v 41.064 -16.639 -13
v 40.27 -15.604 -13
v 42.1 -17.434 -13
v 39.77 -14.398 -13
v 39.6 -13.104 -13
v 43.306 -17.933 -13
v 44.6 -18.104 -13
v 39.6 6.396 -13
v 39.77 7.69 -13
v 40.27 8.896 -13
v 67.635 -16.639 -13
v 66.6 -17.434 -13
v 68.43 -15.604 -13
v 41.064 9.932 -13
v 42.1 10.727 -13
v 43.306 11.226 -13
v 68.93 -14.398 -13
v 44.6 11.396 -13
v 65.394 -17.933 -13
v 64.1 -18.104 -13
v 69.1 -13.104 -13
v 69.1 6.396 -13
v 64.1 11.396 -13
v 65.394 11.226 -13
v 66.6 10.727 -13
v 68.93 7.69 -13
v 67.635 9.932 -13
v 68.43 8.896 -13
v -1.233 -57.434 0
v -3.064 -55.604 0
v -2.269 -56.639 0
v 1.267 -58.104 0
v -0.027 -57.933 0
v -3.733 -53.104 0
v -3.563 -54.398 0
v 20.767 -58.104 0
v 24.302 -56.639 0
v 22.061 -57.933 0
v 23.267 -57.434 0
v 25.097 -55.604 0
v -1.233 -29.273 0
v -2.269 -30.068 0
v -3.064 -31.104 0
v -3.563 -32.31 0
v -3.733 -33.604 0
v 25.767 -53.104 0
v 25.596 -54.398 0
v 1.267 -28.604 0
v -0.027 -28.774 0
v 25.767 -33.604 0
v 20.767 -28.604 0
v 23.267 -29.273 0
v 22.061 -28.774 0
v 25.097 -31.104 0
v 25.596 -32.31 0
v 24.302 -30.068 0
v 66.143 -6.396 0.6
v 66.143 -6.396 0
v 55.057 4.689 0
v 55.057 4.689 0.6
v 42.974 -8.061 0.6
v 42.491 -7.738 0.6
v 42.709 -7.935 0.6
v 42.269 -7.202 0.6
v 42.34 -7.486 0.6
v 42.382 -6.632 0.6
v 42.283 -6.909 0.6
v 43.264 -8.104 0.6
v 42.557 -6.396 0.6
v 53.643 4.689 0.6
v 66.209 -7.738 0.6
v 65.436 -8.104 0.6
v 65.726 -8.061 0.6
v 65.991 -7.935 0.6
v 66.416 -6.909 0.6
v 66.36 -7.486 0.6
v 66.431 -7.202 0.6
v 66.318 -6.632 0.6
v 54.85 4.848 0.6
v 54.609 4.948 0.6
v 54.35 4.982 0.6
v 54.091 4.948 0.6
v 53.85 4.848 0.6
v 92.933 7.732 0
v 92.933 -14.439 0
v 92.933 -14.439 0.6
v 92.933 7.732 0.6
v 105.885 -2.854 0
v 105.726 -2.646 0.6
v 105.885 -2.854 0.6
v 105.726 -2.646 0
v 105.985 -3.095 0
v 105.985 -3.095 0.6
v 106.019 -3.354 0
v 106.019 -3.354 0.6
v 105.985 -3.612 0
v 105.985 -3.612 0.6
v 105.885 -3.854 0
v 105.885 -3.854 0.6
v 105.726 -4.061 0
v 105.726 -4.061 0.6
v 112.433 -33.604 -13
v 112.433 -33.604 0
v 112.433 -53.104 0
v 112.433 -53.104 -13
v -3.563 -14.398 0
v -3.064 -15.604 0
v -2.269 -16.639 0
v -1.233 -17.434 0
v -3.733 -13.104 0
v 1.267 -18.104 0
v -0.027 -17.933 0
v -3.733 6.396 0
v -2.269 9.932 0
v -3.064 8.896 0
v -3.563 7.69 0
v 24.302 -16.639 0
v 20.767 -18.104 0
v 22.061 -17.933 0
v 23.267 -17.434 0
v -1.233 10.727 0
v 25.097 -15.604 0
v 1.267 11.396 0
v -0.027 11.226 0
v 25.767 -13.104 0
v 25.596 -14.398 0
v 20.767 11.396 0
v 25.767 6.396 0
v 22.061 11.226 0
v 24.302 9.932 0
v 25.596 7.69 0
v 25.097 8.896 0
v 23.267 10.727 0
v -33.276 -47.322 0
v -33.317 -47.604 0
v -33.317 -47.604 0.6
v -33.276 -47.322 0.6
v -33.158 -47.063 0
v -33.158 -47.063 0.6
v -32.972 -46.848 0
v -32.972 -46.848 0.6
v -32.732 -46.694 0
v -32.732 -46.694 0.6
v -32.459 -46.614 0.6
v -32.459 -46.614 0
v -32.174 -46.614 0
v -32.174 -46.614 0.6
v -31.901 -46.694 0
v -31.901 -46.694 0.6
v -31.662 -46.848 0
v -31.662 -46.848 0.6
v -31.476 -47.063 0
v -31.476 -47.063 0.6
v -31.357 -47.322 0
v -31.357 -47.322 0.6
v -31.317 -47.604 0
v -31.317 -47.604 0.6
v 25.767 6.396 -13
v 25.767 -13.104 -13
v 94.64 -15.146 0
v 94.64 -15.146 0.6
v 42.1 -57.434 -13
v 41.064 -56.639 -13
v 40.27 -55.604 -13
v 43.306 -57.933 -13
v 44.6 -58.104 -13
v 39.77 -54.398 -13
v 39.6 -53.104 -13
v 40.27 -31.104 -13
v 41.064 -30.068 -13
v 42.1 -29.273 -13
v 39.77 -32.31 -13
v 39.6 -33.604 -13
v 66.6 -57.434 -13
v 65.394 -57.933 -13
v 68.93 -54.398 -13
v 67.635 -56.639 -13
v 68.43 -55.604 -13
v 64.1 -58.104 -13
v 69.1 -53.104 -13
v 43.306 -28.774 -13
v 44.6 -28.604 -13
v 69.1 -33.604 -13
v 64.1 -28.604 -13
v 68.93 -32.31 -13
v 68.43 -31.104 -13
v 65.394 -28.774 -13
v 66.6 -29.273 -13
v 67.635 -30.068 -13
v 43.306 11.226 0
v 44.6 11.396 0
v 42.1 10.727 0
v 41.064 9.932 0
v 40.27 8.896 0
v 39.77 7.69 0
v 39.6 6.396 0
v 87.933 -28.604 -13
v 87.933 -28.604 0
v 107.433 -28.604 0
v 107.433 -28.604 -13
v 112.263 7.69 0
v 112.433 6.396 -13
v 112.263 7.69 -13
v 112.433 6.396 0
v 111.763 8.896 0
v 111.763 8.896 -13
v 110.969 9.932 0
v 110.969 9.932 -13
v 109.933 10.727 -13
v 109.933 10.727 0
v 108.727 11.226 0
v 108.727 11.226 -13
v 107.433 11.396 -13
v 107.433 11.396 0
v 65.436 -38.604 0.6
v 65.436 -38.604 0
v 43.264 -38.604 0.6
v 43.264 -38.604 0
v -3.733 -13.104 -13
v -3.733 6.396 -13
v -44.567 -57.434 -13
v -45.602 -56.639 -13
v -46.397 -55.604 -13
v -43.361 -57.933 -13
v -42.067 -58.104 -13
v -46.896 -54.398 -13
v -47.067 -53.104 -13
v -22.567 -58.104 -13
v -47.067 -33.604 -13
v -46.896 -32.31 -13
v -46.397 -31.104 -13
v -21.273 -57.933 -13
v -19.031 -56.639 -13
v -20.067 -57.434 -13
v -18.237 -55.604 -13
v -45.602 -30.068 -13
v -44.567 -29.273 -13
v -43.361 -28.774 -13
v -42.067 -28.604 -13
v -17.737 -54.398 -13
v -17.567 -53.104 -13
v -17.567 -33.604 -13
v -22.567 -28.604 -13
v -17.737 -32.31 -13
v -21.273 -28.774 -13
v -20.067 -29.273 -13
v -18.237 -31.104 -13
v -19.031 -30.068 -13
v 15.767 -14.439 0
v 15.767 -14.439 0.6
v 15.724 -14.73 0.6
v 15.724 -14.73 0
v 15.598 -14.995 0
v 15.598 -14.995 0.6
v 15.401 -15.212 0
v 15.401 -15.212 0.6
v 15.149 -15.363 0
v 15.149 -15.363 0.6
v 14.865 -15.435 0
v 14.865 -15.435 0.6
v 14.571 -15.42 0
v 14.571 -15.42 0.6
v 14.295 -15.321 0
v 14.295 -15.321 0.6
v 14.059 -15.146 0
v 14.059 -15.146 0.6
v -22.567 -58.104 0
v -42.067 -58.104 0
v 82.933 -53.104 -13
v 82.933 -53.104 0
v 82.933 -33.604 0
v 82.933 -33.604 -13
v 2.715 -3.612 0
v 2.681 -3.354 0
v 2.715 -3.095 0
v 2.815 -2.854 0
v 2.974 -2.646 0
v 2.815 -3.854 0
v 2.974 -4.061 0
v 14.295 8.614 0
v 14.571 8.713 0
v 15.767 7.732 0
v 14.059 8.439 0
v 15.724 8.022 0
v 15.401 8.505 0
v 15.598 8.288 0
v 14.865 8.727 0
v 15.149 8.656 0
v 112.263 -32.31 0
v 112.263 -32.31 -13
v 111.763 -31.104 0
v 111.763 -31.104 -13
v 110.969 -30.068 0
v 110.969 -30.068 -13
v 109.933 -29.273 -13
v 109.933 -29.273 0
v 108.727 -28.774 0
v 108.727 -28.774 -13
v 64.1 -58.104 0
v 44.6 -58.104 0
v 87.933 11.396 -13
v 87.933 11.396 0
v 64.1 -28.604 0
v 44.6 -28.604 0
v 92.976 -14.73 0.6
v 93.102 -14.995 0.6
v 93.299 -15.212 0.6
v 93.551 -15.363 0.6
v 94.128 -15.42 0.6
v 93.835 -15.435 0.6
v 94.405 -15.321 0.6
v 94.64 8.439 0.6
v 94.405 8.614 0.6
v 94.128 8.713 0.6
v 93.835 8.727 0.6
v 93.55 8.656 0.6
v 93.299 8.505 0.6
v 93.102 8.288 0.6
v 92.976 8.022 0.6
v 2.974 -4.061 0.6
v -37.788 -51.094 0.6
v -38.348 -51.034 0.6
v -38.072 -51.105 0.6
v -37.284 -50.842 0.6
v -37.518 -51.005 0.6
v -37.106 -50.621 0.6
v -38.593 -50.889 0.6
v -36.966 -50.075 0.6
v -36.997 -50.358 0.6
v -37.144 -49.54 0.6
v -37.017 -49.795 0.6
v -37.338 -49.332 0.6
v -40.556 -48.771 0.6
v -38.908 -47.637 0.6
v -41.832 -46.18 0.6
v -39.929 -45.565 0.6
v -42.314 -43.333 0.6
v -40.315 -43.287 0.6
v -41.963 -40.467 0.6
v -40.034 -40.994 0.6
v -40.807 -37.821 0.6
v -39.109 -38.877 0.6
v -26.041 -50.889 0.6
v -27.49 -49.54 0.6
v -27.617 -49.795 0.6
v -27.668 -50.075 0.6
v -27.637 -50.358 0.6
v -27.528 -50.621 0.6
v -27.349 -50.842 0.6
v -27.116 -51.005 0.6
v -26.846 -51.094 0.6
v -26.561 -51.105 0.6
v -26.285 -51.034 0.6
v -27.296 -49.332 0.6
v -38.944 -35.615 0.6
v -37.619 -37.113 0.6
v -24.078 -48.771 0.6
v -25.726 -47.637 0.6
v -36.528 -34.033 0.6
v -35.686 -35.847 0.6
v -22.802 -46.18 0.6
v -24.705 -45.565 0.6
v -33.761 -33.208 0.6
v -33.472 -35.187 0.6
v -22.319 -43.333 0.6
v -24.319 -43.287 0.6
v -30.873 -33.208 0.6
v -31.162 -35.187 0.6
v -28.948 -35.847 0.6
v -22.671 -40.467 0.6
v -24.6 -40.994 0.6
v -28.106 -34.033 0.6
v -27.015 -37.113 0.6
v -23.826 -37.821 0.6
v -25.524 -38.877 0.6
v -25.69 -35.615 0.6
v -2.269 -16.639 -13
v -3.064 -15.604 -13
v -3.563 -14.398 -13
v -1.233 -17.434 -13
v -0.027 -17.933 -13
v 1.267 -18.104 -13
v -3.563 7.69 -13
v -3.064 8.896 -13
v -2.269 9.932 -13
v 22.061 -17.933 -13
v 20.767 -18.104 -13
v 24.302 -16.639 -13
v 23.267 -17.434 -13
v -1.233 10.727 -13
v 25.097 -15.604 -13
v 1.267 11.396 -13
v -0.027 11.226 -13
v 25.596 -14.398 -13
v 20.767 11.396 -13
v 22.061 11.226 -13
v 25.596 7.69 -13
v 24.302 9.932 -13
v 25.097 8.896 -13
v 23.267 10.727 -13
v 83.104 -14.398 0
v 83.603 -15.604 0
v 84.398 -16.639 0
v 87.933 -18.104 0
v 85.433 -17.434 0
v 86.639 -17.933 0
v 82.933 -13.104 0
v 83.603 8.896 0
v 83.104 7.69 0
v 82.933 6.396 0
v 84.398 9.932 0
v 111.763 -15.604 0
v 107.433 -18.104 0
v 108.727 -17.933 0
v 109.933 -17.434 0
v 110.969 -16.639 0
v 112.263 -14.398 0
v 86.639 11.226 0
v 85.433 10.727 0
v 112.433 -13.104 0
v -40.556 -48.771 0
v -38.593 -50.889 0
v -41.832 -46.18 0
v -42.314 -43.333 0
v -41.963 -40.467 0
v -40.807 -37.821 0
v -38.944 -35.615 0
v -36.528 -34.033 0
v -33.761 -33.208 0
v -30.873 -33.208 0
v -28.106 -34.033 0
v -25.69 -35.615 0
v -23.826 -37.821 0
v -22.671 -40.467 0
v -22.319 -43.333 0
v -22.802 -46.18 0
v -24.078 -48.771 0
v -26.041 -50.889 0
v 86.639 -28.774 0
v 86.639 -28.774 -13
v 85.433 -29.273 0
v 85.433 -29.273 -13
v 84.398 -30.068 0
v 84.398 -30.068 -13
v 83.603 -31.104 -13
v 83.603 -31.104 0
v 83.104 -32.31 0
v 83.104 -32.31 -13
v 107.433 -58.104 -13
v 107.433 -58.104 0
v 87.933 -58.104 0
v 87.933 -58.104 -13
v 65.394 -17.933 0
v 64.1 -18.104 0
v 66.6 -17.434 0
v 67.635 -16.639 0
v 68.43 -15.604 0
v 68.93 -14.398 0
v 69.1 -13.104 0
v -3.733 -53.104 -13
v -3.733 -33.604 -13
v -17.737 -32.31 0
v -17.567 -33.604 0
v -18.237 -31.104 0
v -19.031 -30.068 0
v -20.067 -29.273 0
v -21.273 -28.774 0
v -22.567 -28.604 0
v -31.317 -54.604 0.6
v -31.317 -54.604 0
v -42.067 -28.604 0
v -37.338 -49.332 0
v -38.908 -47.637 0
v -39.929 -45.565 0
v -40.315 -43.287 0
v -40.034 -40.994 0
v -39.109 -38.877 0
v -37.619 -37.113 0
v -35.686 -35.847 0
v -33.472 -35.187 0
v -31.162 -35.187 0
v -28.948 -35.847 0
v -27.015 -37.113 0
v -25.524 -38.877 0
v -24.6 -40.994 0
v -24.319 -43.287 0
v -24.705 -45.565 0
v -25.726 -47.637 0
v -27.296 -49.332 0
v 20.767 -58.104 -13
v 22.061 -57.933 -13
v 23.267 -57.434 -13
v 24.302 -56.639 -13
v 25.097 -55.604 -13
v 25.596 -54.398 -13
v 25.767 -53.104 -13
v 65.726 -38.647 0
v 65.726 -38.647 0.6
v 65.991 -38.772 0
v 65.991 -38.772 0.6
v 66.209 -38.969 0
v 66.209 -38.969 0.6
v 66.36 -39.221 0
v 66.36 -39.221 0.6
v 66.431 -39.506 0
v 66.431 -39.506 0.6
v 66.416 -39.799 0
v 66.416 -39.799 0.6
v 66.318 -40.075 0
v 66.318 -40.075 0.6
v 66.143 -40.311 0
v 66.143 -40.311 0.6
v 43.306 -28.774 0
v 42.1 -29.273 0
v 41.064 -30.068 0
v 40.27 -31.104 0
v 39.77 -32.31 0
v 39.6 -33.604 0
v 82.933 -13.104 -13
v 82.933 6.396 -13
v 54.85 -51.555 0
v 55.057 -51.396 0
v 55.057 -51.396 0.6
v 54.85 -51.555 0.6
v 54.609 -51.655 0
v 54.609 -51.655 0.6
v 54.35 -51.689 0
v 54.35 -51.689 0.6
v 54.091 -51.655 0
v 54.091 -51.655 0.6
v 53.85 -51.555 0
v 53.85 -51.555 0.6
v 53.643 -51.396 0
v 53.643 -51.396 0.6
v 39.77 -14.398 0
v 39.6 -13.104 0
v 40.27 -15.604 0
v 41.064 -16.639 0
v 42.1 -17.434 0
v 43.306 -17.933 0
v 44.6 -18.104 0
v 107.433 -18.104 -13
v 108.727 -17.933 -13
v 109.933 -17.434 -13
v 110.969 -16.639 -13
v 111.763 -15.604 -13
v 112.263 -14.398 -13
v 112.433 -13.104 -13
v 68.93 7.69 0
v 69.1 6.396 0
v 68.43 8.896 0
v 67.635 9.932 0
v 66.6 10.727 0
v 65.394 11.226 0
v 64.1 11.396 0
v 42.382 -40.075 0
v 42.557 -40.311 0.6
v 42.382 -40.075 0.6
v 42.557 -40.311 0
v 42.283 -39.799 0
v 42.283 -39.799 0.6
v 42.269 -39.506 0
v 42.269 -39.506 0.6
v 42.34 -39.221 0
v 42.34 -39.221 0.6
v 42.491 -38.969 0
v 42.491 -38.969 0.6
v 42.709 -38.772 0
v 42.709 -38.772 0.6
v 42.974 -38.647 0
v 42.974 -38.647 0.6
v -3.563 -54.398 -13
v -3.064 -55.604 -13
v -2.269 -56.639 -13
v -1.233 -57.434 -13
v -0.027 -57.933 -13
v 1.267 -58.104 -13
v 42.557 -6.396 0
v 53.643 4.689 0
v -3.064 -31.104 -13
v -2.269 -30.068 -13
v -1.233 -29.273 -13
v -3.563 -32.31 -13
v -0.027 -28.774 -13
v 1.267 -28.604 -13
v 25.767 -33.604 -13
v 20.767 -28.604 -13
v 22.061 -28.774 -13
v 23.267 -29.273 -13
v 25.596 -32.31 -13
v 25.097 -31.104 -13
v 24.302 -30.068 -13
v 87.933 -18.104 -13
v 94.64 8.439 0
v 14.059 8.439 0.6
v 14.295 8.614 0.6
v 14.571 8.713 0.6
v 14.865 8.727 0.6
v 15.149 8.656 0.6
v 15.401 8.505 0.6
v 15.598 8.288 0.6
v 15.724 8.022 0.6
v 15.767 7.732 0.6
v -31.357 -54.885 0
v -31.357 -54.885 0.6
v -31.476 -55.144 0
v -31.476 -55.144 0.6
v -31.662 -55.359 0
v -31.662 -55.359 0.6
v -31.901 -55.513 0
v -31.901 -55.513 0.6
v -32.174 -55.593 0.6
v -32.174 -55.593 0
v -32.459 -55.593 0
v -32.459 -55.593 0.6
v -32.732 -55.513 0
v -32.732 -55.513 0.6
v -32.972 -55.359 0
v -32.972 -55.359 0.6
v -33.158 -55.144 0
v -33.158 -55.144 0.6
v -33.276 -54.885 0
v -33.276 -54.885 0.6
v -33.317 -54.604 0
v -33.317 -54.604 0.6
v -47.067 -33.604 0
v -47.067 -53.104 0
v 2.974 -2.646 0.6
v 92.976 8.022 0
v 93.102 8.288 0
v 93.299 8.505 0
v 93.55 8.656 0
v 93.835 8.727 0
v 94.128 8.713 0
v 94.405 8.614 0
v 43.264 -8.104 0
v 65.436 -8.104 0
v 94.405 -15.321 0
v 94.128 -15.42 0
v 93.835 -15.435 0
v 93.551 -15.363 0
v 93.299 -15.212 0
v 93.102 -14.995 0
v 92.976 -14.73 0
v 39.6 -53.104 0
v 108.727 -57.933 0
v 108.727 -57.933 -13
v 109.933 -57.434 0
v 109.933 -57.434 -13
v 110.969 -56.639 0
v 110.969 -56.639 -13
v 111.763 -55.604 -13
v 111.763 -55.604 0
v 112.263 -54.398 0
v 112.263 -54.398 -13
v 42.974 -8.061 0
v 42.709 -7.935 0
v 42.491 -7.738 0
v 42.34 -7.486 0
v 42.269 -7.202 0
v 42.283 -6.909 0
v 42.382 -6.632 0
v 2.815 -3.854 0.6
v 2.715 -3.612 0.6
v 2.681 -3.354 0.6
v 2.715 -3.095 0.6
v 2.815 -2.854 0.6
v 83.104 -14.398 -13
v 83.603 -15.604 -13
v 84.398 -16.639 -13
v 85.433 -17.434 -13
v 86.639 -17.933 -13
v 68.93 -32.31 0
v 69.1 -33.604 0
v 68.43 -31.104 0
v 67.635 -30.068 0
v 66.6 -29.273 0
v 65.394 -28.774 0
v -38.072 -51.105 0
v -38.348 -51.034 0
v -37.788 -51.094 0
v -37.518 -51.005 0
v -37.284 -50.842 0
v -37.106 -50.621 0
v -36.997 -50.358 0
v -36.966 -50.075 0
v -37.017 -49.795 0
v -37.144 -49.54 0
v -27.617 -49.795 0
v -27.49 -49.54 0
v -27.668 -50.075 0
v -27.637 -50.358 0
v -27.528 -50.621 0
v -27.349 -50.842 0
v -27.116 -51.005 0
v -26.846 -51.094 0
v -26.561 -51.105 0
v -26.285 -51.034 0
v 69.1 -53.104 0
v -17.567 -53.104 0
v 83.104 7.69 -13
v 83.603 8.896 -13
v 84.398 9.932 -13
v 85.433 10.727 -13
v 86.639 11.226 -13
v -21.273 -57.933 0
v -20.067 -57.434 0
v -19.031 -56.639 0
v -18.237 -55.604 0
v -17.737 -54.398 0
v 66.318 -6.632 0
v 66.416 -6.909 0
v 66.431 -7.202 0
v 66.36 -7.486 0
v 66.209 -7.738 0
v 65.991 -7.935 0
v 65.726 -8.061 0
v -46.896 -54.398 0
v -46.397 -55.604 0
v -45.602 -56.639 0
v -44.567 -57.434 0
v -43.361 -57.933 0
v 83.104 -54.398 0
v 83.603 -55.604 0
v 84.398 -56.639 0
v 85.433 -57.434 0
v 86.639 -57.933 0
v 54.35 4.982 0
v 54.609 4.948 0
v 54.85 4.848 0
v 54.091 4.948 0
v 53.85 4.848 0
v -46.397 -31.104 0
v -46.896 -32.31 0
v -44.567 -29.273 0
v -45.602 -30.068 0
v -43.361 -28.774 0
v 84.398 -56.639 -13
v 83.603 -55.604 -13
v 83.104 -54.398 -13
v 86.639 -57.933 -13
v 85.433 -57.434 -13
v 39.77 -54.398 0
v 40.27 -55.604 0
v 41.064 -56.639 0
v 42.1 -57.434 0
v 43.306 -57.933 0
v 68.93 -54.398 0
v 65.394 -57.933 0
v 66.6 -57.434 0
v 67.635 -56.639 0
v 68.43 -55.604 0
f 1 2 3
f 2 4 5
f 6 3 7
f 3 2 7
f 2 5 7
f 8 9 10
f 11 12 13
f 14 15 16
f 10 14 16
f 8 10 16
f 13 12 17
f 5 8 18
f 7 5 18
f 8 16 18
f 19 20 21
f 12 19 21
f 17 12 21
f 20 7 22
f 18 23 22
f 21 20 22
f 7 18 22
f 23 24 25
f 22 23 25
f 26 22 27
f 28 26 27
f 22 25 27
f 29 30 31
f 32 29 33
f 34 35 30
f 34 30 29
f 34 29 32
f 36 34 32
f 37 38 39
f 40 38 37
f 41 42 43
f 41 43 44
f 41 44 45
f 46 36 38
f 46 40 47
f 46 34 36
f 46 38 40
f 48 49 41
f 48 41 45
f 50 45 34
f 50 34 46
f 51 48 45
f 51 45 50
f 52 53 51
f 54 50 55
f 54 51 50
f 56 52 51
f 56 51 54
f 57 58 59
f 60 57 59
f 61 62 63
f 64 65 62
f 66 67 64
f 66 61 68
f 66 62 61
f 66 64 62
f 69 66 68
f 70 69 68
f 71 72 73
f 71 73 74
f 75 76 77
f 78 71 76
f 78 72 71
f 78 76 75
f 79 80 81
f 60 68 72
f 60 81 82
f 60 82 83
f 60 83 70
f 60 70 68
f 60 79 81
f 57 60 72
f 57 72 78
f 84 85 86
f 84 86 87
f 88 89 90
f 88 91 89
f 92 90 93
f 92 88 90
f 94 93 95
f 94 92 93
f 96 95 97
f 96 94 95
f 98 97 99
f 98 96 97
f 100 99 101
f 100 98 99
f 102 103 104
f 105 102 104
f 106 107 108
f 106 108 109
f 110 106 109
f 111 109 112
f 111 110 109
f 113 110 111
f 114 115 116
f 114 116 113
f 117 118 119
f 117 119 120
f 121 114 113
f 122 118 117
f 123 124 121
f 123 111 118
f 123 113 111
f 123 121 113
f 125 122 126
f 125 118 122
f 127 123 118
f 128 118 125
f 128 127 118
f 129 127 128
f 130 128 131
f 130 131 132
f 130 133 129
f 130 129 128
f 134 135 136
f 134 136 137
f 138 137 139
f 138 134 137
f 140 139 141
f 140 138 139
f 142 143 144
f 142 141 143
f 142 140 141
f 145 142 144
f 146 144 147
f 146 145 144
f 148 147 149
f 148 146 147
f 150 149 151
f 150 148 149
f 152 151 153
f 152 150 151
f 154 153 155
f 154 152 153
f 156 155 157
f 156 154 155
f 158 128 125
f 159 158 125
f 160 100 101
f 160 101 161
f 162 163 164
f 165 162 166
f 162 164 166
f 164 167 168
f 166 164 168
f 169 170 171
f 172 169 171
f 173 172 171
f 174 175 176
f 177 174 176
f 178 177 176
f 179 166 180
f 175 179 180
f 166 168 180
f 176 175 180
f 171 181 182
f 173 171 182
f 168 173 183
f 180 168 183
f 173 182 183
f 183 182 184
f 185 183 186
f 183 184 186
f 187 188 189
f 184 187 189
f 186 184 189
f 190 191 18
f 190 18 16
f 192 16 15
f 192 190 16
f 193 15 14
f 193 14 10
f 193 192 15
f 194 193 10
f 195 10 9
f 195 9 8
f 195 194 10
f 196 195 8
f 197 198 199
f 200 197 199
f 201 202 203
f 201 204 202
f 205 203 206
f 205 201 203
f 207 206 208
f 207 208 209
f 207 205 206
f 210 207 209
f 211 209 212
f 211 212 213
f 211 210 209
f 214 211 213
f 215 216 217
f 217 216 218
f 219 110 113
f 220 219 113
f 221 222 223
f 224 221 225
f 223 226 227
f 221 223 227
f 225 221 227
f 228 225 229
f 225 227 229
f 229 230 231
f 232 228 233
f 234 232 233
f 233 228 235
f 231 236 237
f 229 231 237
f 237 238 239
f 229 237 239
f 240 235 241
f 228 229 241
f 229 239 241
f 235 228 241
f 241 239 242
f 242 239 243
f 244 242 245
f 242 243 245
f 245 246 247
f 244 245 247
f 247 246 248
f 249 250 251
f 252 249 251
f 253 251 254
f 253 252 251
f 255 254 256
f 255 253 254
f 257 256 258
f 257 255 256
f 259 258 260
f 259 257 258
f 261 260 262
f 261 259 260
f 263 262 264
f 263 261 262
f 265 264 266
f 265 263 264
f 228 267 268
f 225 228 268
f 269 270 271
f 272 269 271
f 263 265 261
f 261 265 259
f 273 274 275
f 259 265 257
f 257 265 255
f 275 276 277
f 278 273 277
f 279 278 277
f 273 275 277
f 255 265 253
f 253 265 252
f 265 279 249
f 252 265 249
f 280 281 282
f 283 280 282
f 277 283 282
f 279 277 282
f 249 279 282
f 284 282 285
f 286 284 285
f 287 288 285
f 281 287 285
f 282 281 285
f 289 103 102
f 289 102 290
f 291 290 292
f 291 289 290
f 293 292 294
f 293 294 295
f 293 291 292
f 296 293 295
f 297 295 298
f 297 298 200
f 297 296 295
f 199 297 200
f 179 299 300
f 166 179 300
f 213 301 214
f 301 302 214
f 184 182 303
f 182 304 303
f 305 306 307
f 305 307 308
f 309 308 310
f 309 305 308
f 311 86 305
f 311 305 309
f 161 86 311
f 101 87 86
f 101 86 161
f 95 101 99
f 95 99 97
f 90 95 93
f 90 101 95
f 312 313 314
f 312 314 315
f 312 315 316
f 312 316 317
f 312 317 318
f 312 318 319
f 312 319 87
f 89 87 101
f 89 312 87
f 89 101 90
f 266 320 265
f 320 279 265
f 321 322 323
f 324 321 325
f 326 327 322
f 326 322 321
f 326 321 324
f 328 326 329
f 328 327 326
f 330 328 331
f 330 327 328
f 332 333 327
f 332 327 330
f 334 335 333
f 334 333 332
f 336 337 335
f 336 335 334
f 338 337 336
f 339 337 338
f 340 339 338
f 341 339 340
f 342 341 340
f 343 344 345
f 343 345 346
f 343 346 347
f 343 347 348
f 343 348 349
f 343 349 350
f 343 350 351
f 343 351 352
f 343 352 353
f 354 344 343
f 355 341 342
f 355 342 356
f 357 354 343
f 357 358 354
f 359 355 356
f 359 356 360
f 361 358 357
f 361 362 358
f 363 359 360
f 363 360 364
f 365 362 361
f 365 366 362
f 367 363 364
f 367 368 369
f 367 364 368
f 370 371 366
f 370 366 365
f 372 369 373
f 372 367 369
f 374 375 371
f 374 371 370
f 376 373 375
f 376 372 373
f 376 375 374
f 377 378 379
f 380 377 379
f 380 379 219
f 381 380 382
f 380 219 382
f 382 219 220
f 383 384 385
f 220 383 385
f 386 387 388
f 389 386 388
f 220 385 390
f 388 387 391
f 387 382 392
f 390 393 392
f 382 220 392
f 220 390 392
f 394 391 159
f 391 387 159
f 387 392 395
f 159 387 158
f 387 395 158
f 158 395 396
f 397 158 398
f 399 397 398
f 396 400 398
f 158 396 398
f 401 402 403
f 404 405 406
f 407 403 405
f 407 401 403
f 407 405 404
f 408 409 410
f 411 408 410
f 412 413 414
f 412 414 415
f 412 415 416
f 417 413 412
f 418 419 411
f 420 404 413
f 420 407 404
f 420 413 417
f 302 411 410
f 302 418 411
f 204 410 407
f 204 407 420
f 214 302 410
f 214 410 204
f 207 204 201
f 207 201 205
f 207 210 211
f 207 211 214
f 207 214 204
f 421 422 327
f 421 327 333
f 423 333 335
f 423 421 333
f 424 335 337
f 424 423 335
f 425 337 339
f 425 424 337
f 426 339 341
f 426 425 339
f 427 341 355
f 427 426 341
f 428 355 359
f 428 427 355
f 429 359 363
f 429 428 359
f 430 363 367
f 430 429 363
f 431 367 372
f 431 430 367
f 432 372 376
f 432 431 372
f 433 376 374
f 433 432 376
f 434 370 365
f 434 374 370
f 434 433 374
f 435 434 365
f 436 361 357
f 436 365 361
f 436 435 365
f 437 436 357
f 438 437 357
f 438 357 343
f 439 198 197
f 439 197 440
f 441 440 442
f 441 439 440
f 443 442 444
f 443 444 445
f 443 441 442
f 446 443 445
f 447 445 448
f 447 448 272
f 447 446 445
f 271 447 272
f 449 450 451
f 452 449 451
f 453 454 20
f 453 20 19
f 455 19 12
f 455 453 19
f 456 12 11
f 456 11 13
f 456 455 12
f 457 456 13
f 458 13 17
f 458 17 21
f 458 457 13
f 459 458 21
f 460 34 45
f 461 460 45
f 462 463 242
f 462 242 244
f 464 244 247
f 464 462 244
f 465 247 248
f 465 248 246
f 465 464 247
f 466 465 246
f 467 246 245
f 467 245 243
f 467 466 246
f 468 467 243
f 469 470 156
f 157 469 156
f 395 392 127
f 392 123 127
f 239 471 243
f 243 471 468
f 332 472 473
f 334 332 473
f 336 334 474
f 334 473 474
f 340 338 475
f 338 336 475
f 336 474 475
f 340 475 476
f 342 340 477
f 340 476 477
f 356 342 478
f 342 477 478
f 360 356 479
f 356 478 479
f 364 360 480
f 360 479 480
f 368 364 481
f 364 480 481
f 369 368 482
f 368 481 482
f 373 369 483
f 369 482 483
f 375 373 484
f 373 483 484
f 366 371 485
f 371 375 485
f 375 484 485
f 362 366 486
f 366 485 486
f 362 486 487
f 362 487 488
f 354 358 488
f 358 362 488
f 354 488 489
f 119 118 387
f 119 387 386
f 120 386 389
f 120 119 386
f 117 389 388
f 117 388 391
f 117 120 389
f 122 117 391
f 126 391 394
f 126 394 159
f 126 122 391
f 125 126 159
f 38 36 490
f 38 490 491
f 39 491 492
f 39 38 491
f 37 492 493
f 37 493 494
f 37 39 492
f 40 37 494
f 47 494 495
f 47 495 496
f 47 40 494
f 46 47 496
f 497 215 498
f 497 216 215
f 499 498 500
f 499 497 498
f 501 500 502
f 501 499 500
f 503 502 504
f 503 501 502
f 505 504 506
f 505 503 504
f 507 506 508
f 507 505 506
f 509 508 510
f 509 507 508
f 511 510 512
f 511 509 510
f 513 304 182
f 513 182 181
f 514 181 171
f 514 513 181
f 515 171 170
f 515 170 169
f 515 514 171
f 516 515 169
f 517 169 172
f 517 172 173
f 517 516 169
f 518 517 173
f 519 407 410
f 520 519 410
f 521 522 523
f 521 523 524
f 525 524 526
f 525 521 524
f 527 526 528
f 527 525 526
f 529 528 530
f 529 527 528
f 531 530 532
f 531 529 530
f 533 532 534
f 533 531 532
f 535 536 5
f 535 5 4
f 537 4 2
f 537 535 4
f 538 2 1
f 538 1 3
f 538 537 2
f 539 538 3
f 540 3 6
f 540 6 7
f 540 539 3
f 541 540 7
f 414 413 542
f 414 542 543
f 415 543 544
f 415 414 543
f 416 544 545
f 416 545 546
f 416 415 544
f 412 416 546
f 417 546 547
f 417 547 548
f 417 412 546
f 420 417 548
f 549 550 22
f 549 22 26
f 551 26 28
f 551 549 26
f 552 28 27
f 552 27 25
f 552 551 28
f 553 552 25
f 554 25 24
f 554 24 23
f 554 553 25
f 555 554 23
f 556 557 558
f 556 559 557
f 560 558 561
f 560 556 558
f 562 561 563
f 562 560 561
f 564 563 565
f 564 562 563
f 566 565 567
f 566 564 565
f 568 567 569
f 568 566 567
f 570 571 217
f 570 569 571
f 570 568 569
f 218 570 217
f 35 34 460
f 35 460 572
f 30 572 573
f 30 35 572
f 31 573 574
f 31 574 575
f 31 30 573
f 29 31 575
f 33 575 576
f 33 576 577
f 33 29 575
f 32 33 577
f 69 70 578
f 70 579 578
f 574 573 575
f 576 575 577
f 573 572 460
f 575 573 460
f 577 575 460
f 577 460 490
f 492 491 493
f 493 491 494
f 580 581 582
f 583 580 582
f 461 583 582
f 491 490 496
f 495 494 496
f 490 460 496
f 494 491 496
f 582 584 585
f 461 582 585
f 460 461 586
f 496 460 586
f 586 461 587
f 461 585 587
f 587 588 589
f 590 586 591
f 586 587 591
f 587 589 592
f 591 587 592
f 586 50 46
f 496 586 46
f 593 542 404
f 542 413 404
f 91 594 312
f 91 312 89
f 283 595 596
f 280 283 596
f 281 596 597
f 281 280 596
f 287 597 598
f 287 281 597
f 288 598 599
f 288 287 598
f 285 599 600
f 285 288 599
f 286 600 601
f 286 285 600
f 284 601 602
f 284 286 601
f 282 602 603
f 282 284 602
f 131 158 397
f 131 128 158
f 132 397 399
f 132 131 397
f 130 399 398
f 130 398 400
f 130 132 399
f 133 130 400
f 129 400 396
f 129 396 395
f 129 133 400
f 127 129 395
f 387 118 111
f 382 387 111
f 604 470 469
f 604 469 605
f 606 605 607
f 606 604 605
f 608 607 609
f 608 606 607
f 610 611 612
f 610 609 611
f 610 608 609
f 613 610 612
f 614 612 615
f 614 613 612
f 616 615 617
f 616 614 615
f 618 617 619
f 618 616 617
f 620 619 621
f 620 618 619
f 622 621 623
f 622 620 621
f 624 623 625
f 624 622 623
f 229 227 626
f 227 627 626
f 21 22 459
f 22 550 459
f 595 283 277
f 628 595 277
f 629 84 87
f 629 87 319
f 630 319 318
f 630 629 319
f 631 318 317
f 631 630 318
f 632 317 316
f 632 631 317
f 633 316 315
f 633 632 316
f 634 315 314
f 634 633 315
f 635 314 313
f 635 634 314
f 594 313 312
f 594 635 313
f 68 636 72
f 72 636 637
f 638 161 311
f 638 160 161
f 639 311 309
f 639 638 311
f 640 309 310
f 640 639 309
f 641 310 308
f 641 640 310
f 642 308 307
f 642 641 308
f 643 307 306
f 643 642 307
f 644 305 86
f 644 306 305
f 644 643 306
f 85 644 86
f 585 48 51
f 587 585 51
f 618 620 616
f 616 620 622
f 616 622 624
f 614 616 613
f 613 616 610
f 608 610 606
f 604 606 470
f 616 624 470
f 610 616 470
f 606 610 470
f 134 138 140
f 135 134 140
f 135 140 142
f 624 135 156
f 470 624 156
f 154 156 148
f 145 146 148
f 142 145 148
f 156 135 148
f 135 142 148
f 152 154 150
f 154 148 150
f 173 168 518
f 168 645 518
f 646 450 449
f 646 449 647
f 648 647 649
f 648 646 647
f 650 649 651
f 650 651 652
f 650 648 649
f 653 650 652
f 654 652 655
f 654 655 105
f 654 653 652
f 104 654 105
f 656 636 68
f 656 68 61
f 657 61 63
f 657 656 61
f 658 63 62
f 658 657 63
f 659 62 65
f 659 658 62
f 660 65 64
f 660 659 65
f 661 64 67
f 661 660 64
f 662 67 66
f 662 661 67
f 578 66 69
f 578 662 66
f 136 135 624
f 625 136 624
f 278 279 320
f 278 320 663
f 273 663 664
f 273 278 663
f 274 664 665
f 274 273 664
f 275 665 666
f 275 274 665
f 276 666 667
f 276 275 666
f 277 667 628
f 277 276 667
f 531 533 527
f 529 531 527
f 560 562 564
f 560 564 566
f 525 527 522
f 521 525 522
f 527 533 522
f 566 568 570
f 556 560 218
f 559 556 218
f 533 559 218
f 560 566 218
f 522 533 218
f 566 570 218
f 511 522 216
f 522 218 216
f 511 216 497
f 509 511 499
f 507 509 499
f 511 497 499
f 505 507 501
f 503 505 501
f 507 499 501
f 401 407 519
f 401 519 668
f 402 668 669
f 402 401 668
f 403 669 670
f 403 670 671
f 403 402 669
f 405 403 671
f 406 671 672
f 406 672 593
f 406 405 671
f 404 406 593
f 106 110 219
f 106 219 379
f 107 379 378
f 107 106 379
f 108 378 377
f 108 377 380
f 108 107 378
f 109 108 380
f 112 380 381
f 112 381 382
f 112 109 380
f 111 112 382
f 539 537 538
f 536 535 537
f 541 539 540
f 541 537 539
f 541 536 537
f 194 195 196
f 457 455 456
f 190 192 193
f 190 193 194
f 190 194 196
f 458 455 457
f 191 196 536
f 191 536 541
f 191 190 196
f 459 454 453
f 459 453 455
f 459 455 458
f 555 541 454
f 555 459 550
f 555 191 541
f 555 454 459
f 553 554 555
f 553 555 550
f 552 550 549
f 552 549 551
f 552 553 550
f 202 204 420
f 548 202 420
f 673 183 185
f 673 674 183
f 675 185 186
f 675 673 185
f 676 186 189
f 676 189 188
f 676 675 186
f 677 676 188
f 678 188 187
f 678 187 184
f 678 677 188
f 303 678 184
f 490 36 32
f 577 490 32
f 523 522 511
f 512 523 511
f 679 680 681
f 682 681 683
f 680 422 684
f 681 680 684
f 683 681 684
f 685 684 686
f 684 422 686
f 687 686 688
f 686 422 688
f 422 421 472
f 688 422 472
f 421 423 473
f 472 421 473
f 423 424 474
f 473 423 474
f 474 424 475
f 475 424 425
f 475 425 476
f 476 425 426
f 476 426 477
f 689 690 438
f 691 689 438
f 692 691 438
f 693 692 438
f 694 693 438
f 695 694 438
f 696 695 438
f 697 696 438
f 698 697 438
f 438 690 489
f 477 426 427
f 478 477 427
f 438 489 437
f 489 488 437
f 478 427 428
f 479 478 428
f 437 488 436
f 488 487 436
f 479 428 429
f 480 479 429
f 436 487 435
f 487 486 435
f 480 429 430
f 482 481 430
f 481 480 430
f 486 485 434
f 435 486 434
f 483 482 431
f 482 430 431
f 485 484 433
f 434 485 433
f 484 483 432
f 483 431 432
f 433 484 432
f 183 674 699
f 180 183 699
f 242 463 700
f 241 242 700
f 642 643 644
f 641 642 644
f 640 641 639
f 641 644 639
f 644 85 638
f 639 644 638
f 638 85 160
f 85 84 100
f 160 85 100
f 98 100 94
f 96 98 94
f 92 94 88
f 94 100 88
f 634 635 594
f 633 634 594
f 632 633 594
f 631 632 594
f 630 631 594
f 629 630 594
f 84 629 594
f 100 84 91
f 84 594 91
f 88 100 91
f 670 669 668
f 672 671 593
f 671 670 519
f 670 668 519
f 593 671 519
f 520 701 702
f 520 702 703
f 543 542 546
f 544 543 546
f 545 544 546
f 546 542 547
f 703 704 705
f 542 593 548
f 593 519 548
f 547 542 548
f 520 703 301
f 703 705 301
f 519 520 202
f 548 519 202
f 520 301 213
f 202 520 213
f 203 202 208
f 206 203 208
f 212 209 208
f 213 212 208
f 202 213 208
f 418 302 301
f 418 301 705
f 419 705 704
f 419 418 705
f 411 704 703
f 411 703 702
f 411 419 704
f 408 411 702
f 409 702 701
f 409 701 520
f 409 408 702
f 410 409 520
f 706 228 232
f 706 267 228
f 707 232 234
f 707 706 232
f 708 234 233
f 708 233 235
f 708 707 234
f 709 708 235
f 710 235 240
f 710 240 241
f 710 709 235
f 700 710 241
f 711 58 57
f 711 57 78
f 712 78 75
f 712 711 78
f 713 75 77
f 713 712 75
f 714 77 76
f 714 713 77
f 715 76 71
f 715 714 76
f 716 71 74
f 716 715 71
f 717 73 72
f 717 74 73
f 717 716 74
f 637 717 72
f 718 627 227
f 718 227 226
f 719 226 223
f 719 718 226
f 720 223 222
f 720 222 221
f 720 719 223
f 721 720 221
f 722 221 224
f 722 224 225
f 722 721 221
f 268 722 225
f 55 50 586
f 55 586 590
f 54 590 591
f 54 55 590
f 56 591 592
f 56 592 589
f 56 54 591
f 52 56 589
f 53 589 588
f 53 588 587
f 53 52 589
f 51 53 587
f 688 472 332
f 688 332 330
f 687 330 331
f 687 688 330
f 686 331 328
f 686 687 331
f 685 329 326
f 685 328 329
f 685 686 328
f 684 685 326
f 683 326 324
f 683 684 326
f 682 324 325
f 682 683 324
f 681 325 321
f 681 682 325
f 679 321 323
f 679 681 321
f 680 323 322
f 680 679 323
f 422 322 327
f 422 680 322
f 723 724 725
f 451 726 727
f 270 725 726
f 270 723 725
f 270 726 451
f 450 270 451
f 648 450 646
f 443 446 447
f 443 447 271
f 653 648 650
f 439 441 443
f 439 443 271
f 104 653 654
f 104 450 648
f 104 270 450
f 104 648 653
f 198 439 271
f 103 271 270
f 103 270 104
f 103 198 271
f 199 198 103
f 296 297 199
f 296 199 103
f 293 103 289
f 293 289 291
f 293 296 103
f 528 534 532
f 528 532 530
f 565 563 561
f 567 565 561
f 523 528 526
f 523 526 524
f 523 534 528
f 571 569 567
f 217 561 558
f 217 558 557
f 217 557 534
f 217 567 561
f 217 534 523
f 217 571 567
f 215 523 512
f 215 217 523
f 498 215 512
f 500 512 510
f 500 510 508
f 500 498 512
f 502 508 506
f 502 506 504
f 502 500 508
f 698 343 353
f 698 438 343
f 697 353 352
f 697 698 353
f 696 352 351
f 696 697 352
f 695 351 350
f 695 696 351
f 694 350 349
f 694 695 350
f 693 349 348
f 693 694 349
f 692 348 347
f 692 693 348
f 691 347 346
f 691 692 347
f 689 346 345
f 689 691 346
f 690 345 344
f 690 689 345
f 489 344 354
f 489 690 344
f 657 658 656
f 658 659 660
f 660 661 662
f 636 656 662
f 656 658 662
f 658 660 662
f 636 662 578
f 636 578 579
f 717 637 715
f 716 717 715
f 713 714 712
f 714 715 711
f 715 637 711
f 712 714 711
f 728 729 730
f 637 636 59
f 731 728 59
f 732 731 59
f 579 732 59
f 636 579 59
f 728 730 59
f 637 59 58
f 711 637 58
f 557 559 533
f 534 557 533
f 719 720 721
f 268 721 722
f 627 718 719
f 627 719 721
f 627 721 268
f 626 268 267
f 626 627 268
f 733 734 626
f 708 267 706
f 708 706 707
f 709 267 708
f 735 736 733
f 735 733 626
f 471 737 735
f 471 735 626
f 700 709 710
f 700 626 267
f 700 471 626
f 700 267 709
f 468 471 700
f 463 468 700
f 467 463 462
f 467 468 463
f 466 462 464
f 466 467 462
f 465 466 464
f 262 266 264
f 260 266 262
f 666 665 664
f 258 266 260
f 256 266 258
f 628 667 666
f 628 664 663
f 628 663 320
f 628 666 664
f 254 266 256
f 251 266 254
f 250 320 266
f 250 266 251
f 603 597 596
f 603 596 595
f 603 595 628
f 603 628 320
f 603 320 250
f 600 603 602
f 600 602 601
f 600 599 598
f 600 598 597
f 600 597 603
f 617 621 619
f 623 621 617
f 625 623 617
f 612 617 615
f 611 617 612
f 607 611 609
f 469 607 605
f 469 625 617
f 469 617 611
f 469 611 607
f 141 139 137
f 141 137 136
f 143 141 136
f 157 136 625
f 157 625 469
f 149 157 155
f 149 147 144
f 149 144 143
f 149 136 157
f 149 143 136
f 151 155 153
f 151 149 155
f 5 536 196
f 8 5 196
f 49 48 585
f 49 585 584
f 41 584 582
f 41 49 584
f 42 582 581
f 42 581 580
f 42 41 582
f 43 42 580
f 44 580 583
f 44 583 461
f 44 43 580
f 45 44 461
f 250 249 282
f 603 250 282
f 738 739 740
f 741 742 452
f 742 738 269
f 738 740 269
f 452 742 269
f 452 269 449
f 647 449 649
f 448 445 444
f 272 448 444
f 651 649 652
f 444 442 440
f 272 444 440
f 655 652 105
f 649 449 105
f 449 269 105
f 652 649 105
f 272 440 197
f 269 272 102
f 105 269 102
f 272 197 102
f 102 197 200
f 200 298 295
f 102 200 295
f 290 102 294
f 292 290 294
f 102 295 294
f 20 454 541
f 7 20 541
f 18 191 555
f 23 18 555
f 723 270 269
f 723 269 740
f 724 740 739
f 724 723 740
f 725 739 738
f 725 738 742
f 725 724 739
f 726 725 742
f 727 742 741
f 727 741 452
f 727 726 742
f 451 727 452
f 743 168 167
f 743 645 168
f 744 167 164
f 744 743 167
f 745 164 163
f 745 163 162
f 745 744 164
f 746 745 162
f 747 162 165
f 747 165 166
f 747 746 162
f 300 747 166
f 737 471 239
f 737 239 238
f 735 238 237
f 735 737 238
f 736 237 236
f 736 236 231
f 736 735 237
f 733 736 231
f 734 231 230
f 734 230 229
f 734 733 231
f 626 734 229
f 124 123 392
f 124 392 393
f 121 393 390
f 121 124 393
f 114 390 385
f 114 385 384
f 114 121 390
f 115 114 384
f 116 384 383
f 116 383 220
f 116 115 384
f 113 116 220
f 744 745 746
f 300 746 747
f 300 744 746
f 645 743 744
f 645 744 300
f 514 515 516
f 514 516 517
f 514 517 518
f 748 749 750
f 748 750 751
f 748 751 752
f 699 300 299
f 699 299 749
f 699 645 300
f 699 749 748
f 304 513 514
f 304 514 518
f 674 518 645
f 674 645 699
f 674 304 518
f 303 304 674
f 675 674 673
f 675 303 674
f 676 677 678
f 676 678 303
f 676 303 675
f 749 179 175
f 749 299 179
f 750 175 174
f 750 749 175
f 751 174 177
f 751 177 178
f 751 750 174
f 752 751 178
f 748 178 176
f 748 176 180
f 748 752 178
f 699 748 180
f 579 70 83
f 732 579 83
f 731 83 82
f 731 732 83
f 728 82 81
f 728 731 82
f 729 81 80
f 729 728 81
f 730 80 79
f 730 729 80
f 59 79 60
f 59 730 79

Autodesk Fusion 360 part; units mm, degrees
sketch "Sketch1" plane through (0, 0, 0) normal (0, 0, 1) x (1, 0, 0)
  line L0 (-42.0668, -28.6036) -> (-22.5668, -28.6036)
  line L1 (-17.5668, -33.6036) -> (-17.5668, -53.1036)
  line L2 (-22.5668, -58.1036) -> (-42.0668, -58.1036)
  line L3 (-47.0668, -53.1036) -> (-47.0668, -33.6036)
  arc A0 (-42.0668, -28.6036) -> (-47.0668, -33.6036) centre (-42.0668, -33.6036) ccw
  arc A1 (-17.5668, -33.6036) -> (-22.5668, -28.6036) centre (-22.5668, -33.6036) ccw
  arc A2 (-22.5668, -58.1036) -> (-17.5668, -53.1036) centre (-22.5668, -53.1036) ccw
  arc A3 (-47.0668, -53.1036) -> (-42.0668, -58.1036) centre (-42.0668, -53.1036) ccw
  arc A4 (20.7666, -58.1036) -> (25.7666, -53.1036) centre (20.7666, -53.1036) ccw
  arc A5 (1.2666, -28.6036) -> (-3.7334, -33.6036) centre (1.2666, -33.6036) ccw
  line L4 (-3.7334, -53.1036) -> (-3.7334, -33.6036)
  line L5 (20.7666, -58.1036) -> (1.2666, -58.1036)
  arc A6 (25.7666, -33.6036) -> (20.7666, -28.6036) centre (20.7666, -33.6036) ccw
  arc A7 (-3.7334, -53.1036) -> (1.2666, -58.1036) centre (1.2666, -53.1036) ccw
  line L6 (1.2666, -28.6036) -> (20.7666, -28.6036)
  line L7 (25.7666, -33.6036) -> (25.7666, -53.1036)
  arc A8 (64.0999, -58.1036) -> (69.0999, -53.1036) centre (64.0999, -53.1036) ccw
  arc A9 (44.5999, -28.6036) -> (39.5999, -33.6036) centre (44.5999, -33.6036) ccw
  line L8 (39.5999, -53.1036) -> (39.5999, -33.6036)
  line L9 (64.0999, -58.1036) -> (44.5999, -58.1036)
  arc A10 (69.0999, -33.6036) -> (64.0999, -28.6036) centre (64.0999, -33.6036) ccw
  arc A11 (39.5999, -53.1036) -> (44.5999, -58.1036) centre (44.5999, -53.1036) ccw
  line L10 (44.5999, -28.6036) -> (64.0999, -28.6036)
  line L11 (69.0999, -33.6036) -> (69.0999, -53.1036)
  arc A12 (107.4332, -58.1036) -> (112.4332, -53.1036) centre (107.4332, -53.1036) ccw
  arc A13 (87.9332, -28.6036) -> (82.9332, -33.6036) centre (87.9332, -33.6036) ccw
  line L12 (82.9332, -53.1036) -> (82.9332, -33.6036)
  line L13 (107.4332, -58.1036) -> (87.9332, -58.1036)
  arc A14 (112.4332, -33.6036) -> (107.4332, -28.6036) centre (107.4332, -33.6036) ccw
  arc A15 (82.9332, -53.1036) -> (87.9332, -58.1036) centre (87.9332, -53.1036) ccw
  line L14 (87.9332, -28.6036) -> (107.4332, -28.6036)
  line L15 (112.4332, -33.6036) -> (112.4332, -53.1036)
  arc A16 (20.7666, -18.1036) -> (25.7666, -13.1036) centre (20.7666, -13.1036) ccw
  arc A17 (1.2666, 11.3964) -> (-3.7334, 6.3964) centre (1.2666, 6.3964) ccw
  line L16 (-3.7334, -13.1036) -> (-3.7334, 6.3964)
  line L17 (20.7666, -18.1036) -> (1.2666, -18.1036)
  arc A18 (25.7666, 6.3964) -> (20.7666, 11.3964) centre (20.7666, 6.3964) ccw
  arc A19 (-3.7334, -13.1036) -> (1.2666, -18.1036) centre (1.2666, -13.1036) ccw
  line L18 (1.2666, 11.3964) -> (20.7666, 11.3964)
  line L19 (25.7666, 6.3964) -> (25.7666, -13.1036)
  arc A20 (64.0999, -18.1036) -> (69.0999, -13.1036) centre (64.0999, -13.1036) ccw
  arc A21 (44.5999, 11.3964) -> (39.5999, 6.3964) centre (44.5999, 6.3964) ccw
  line L20 (39.5999, -13.1036) -> (39.5999, 6.3964)
  line L21 (64.0999, -18.1036) -> (44.5999, -18.1036)
  arc A22 (69.0999, 6.3964) -> (64.0999, 11.3964) centre (64.0999, 6.3964) ccw
  arc A23 (39.5999, -13.1036) -> (44.5999, -18.1036) centre (44.5999, -13.1036) ccw
  line L22 (44.5999, 11.3964) -> (64.0999, 11.3964)
  line L23 (69.0999, 6.3964) -> (69.0999, -13.1036)
  arc A24 (107.4332, -18.1036) -> (112.4332, -13.1036) centre (107.4332, -13.1036) ccw
  arc A25 (87.9332, 11.3964) -> (82.9332, 6.3964) centre (87.9332, 6.3964) ccw
  line L24 (82.9332, -13.1036) -> (82.9332, 6.3964)
  line L25 (107.4332, -18.1036) -> (87.9332, -18.1036)
  arc A26 (112.4332, 6.3964) -> (107.4332, 11.3964) centre (107.4332, 6.3964) ccw
  arc A27 (82.9332, -13.1036) -> (87.9332, -18.1036) centre (87.9332, -13.1036) ccw
  line L26 (87.9332, 11.3964) -> (107.4332, 11.3964)
  line L27 (112.4332, 6.3964) -> (112.4332, -13.1036)
  line L28 (54.3499, -58.1036) -> (54.3499, -52.1036)
  line L29 (55.057, -51.3965) -> (66.1428, -40.3107)
  line L30 (65.4357, -38.6036) -> (43.2641, -38.6036)
  line L31 (42.557, -40.3107) -> (53.6428, -51.3965)
  arc A28 (66.1428, -40.3107) -> (65.4357, -38.6036) centre (65.4357, -39.6036) ccw
  arc A29 (43.2641, -38.6036) -> (42.557, -40.3107) centre (43.2641, -39.6036) ccw
  arc A30 (53.6428, -51.3965) -> (55.057, -51.3965) centre (54.3499, -50.6894) ccw
  line L32 (54.3499, 11.3964) -> (54.3499, 5.3964)
  line L33 (53.6428, 4.6893) -> (42.557, -6.3965)
  line L34 (43.2641, -8.1036) -> (65.4357, -8.1036)
  line L35 (66.1428, -6.3965) -> (55.057, 4.6893)
  arc A31 (65.4357, -8.1036) -> (66.1428, -6.3965) centre (65.4357, -7.1036) ccw
  arc A32 (42.557, -6.3965) -> (43.2641, -8.1036) centre (43.2641, -7.1036) ccw
  arc A33 (55.057, 4.6893) -> (53.6428, 4.6893) centre (54.3499, 3.9821) ccw
  line L36 (112.4332, -3.3536) -> (106.4332, -3.3536)
  line L37 (-3.7334, -3.3536) -> (2.2666, -3.3536)
  line L38 (105.7261, -4.0607) -> (94.6403, -15.1465)
  line L39 (92.9332, -14.4394) -> (92.9332, 7.7321)
  line L40 (94.6403, 8.4393) -> (105.7261, -2.6465)
  line L41 (2.9737, -4.0607) -> (14.0594, -15.1465)
  line L42 (15.7666, -14.4394) -> (15.7666, 7.7321)
  line L43 (14.0594, 8.4393) -> (2.9737, -2.6465)
  arc A34 (92.9332, -14.4394) -> (94.6403, -15.1465) centre (93.9332, -14.4394) ccw
  arc A35 (94.6403, 8.4393) -> (92.9332, 7.7321) centre (93.9332, 7.7321) ccw
  arc A36 (105.7261, -4.0607) -> (105.7261, -2.6465) centre (105.019, -3.3536) ccw
  arc A37 (14.0594, -15.1465) -> (15.7666, -14.4394) centre (14.7666, -14.4394) ccw
  arc A38 (15.7666, 7.7321) -> (14.0594, 8.4393) centre (14.7666, 7.7321) ccw
  arc A39 (2.9737, -2.6465) -> (2.9737, -4.0607) centre (3.6808, -3.3536) ccw
  arc A40 (-26.0406, -50.8888) -> (-38.593, -50.8888) centre (-32.3168, -43.1036) ccw
  arc A41 (-27.2958, -49.3318) -> (-37.3378, -49.3318) centre (-32.3168, -43.1036) ccw
  arc A42 (-27.2958, -49.3318) -> (-26.0406, -50.8888) centre (-26.6682, -50.1103) ccw
  arc A43 (-38.593, -50.8888) -> (-37.3378, -49.3318) centre (-37.9654, -50.1103) ccw
  line L44 (-31.3168, -54.6036) -> (-31.3168, -47.6036)
  arc A44 (-31.3168, -47.6036) -> (-33.3168, -47.6036) centre (-32.3168, -47.6036) ccw
  line L45 (-33.3168, -47.6036) -> (-33.3168, -54.6036)
  arc A45 (-33.3168, -54.6036) -> (-31.3168, -54.6036) centre (-32.3168, -54.6036) ccw
  line L46 (-32.3168, -54.6036) -> (-32.3168, -47.6036) construction
  point P0 (-47.0668, -28.6036)
  point P1 (-17.5668, -28.6036)
  point P2 (-47.0668, -58.1036)
  point P3 (-3.7334, -58.1036)
  point P4 (25.7666, -28.6036)
  point P5 (-3.7334, -28.6036)
  point P6 (39.5999, -58.1036)
  point P7 (69.0999, -28.6036)
  point P8 (39.5999, -28.6036)
  point P9 (82.9332, -58.1036)
  point P10 (112.4332, -28.6036)
  point P11 (82.9332, -28.6036)
  point P12 (-3.7334, -18.1036)
  point P13 (25.7666, 11.3964)
  point P14 (-3.7334, 11.3964)
  point P15 (39.5999, -18.1036)
  point P16 (69.0999, 11.3964)
  point P17 (39.5999, 11.3964)
  point P18 (82.9332, -18.1036)
  point P19 (112.4332, 11.3964)
  point P20 (82.9332, 11.3964)
  dimension "d15" = 29.5
  dimension "d16" = 29.5
  dimension "d17" = 5
  dimension "d18" = 5
  dimension "d21" = 130
  dimension "d22" = 40
  dimension "d23" = 6
  dimension "d24" = 45
  dimension "d25" = 45
  dimension "d26" = 10
  dimension "d27" = 1
  dimension "d28" = 1
  dimension "d29" = 1
  dimension "d30" = 6
  dimension "d31" = 45
  dimension "d32" = 45
  dimension "d33" = 10
  dimension "d34" = 1
  dimension "d35" = 1
  dimension "d36" = 1
  dimension "d37" = 6
  dimension "d38" = 6
  dimension "d39" = 45
  dimension "d40" = 45
  dimension "d41" = 45
  dimension "d42" = 45
  dimension "d43" = 10
  dimension "d44" = 10
  dimension "d45" = 1
  dimension "d46" = 1
  dimension "d47" = 1
  dimension "d48" = 1
  dimension "d49" = 1
  dimension "d50" = 1
  dimension "d51" = 20
  dimension "d52" = 16
  dimension "d54" = 2
  dimension "d55" = 7
  dimension "d56" = 3.5
  dimension "d61" = 14.75
  dimension "d62" = 14.75
extrude "Extrude1" add sketch "Sketch1" along normal blind 0.6 contours L29 L30 L31 A28 A29 A30 | L33 L34 L35 A31 A32 A33 | L38 L39 L40 A34 A35 A36 | L41 L42 L43 A37 A38 A39 | A40 A41 A42 A43 | L44 A44 L45 A45 makes body 1 at (54.1142, -42.8679, 0) makes body 2 at (11.5023, -3.1179, 0) makes body 3 at (-23.2784, -45.3338, 0) makes body 4 at (97.1975, -3.1179, 0) makes body 5 at (54.5856, -3.8393, 0) makes body 6 at (-32.6501, -49.937, 0)
extrude "Extrude2" add sketch "Sketch1" against normal blind 13 separate body contours L0 L1 L2 L3 A0 A1 A2 A3 | A4 A5 L4 L5 A6 A7 L6 L7 | A8 A9 L8 L9 A10 A11 L10 L11 | A12 A13 L12 L13 A14 A15 L14 L15 | A16 A17 L16 L17 A18 A19 L18 L19 | A20 A21 L20 L21 A22 A23 L22 L23 | A24 A25 L24 L25 A26 A27 L26 L27 | L29 L30 L31 A28 A29 A30 | L33 L34 L35 A31 A32 A33 | L38 L39 L40 A34 A35 A36 | L41 L42 L43 A37 A38 A39 | A40 A41 A42 A43 | L44 A44 L45 A45 makes body 7 at (57.5999, -44.937, 0) makes body 8 at (14.2666, -4.937, 0) makes body 9 at (-29.0668, -48.2703, 0) makes body 10 at (51.0999, 1.563, 0) makes body 11 at (102.5999, -0.1036, 0) makes body 12 at (15.9332, -46.6036, 0) makes body 13 at (100.9332, -38.437, 0)
